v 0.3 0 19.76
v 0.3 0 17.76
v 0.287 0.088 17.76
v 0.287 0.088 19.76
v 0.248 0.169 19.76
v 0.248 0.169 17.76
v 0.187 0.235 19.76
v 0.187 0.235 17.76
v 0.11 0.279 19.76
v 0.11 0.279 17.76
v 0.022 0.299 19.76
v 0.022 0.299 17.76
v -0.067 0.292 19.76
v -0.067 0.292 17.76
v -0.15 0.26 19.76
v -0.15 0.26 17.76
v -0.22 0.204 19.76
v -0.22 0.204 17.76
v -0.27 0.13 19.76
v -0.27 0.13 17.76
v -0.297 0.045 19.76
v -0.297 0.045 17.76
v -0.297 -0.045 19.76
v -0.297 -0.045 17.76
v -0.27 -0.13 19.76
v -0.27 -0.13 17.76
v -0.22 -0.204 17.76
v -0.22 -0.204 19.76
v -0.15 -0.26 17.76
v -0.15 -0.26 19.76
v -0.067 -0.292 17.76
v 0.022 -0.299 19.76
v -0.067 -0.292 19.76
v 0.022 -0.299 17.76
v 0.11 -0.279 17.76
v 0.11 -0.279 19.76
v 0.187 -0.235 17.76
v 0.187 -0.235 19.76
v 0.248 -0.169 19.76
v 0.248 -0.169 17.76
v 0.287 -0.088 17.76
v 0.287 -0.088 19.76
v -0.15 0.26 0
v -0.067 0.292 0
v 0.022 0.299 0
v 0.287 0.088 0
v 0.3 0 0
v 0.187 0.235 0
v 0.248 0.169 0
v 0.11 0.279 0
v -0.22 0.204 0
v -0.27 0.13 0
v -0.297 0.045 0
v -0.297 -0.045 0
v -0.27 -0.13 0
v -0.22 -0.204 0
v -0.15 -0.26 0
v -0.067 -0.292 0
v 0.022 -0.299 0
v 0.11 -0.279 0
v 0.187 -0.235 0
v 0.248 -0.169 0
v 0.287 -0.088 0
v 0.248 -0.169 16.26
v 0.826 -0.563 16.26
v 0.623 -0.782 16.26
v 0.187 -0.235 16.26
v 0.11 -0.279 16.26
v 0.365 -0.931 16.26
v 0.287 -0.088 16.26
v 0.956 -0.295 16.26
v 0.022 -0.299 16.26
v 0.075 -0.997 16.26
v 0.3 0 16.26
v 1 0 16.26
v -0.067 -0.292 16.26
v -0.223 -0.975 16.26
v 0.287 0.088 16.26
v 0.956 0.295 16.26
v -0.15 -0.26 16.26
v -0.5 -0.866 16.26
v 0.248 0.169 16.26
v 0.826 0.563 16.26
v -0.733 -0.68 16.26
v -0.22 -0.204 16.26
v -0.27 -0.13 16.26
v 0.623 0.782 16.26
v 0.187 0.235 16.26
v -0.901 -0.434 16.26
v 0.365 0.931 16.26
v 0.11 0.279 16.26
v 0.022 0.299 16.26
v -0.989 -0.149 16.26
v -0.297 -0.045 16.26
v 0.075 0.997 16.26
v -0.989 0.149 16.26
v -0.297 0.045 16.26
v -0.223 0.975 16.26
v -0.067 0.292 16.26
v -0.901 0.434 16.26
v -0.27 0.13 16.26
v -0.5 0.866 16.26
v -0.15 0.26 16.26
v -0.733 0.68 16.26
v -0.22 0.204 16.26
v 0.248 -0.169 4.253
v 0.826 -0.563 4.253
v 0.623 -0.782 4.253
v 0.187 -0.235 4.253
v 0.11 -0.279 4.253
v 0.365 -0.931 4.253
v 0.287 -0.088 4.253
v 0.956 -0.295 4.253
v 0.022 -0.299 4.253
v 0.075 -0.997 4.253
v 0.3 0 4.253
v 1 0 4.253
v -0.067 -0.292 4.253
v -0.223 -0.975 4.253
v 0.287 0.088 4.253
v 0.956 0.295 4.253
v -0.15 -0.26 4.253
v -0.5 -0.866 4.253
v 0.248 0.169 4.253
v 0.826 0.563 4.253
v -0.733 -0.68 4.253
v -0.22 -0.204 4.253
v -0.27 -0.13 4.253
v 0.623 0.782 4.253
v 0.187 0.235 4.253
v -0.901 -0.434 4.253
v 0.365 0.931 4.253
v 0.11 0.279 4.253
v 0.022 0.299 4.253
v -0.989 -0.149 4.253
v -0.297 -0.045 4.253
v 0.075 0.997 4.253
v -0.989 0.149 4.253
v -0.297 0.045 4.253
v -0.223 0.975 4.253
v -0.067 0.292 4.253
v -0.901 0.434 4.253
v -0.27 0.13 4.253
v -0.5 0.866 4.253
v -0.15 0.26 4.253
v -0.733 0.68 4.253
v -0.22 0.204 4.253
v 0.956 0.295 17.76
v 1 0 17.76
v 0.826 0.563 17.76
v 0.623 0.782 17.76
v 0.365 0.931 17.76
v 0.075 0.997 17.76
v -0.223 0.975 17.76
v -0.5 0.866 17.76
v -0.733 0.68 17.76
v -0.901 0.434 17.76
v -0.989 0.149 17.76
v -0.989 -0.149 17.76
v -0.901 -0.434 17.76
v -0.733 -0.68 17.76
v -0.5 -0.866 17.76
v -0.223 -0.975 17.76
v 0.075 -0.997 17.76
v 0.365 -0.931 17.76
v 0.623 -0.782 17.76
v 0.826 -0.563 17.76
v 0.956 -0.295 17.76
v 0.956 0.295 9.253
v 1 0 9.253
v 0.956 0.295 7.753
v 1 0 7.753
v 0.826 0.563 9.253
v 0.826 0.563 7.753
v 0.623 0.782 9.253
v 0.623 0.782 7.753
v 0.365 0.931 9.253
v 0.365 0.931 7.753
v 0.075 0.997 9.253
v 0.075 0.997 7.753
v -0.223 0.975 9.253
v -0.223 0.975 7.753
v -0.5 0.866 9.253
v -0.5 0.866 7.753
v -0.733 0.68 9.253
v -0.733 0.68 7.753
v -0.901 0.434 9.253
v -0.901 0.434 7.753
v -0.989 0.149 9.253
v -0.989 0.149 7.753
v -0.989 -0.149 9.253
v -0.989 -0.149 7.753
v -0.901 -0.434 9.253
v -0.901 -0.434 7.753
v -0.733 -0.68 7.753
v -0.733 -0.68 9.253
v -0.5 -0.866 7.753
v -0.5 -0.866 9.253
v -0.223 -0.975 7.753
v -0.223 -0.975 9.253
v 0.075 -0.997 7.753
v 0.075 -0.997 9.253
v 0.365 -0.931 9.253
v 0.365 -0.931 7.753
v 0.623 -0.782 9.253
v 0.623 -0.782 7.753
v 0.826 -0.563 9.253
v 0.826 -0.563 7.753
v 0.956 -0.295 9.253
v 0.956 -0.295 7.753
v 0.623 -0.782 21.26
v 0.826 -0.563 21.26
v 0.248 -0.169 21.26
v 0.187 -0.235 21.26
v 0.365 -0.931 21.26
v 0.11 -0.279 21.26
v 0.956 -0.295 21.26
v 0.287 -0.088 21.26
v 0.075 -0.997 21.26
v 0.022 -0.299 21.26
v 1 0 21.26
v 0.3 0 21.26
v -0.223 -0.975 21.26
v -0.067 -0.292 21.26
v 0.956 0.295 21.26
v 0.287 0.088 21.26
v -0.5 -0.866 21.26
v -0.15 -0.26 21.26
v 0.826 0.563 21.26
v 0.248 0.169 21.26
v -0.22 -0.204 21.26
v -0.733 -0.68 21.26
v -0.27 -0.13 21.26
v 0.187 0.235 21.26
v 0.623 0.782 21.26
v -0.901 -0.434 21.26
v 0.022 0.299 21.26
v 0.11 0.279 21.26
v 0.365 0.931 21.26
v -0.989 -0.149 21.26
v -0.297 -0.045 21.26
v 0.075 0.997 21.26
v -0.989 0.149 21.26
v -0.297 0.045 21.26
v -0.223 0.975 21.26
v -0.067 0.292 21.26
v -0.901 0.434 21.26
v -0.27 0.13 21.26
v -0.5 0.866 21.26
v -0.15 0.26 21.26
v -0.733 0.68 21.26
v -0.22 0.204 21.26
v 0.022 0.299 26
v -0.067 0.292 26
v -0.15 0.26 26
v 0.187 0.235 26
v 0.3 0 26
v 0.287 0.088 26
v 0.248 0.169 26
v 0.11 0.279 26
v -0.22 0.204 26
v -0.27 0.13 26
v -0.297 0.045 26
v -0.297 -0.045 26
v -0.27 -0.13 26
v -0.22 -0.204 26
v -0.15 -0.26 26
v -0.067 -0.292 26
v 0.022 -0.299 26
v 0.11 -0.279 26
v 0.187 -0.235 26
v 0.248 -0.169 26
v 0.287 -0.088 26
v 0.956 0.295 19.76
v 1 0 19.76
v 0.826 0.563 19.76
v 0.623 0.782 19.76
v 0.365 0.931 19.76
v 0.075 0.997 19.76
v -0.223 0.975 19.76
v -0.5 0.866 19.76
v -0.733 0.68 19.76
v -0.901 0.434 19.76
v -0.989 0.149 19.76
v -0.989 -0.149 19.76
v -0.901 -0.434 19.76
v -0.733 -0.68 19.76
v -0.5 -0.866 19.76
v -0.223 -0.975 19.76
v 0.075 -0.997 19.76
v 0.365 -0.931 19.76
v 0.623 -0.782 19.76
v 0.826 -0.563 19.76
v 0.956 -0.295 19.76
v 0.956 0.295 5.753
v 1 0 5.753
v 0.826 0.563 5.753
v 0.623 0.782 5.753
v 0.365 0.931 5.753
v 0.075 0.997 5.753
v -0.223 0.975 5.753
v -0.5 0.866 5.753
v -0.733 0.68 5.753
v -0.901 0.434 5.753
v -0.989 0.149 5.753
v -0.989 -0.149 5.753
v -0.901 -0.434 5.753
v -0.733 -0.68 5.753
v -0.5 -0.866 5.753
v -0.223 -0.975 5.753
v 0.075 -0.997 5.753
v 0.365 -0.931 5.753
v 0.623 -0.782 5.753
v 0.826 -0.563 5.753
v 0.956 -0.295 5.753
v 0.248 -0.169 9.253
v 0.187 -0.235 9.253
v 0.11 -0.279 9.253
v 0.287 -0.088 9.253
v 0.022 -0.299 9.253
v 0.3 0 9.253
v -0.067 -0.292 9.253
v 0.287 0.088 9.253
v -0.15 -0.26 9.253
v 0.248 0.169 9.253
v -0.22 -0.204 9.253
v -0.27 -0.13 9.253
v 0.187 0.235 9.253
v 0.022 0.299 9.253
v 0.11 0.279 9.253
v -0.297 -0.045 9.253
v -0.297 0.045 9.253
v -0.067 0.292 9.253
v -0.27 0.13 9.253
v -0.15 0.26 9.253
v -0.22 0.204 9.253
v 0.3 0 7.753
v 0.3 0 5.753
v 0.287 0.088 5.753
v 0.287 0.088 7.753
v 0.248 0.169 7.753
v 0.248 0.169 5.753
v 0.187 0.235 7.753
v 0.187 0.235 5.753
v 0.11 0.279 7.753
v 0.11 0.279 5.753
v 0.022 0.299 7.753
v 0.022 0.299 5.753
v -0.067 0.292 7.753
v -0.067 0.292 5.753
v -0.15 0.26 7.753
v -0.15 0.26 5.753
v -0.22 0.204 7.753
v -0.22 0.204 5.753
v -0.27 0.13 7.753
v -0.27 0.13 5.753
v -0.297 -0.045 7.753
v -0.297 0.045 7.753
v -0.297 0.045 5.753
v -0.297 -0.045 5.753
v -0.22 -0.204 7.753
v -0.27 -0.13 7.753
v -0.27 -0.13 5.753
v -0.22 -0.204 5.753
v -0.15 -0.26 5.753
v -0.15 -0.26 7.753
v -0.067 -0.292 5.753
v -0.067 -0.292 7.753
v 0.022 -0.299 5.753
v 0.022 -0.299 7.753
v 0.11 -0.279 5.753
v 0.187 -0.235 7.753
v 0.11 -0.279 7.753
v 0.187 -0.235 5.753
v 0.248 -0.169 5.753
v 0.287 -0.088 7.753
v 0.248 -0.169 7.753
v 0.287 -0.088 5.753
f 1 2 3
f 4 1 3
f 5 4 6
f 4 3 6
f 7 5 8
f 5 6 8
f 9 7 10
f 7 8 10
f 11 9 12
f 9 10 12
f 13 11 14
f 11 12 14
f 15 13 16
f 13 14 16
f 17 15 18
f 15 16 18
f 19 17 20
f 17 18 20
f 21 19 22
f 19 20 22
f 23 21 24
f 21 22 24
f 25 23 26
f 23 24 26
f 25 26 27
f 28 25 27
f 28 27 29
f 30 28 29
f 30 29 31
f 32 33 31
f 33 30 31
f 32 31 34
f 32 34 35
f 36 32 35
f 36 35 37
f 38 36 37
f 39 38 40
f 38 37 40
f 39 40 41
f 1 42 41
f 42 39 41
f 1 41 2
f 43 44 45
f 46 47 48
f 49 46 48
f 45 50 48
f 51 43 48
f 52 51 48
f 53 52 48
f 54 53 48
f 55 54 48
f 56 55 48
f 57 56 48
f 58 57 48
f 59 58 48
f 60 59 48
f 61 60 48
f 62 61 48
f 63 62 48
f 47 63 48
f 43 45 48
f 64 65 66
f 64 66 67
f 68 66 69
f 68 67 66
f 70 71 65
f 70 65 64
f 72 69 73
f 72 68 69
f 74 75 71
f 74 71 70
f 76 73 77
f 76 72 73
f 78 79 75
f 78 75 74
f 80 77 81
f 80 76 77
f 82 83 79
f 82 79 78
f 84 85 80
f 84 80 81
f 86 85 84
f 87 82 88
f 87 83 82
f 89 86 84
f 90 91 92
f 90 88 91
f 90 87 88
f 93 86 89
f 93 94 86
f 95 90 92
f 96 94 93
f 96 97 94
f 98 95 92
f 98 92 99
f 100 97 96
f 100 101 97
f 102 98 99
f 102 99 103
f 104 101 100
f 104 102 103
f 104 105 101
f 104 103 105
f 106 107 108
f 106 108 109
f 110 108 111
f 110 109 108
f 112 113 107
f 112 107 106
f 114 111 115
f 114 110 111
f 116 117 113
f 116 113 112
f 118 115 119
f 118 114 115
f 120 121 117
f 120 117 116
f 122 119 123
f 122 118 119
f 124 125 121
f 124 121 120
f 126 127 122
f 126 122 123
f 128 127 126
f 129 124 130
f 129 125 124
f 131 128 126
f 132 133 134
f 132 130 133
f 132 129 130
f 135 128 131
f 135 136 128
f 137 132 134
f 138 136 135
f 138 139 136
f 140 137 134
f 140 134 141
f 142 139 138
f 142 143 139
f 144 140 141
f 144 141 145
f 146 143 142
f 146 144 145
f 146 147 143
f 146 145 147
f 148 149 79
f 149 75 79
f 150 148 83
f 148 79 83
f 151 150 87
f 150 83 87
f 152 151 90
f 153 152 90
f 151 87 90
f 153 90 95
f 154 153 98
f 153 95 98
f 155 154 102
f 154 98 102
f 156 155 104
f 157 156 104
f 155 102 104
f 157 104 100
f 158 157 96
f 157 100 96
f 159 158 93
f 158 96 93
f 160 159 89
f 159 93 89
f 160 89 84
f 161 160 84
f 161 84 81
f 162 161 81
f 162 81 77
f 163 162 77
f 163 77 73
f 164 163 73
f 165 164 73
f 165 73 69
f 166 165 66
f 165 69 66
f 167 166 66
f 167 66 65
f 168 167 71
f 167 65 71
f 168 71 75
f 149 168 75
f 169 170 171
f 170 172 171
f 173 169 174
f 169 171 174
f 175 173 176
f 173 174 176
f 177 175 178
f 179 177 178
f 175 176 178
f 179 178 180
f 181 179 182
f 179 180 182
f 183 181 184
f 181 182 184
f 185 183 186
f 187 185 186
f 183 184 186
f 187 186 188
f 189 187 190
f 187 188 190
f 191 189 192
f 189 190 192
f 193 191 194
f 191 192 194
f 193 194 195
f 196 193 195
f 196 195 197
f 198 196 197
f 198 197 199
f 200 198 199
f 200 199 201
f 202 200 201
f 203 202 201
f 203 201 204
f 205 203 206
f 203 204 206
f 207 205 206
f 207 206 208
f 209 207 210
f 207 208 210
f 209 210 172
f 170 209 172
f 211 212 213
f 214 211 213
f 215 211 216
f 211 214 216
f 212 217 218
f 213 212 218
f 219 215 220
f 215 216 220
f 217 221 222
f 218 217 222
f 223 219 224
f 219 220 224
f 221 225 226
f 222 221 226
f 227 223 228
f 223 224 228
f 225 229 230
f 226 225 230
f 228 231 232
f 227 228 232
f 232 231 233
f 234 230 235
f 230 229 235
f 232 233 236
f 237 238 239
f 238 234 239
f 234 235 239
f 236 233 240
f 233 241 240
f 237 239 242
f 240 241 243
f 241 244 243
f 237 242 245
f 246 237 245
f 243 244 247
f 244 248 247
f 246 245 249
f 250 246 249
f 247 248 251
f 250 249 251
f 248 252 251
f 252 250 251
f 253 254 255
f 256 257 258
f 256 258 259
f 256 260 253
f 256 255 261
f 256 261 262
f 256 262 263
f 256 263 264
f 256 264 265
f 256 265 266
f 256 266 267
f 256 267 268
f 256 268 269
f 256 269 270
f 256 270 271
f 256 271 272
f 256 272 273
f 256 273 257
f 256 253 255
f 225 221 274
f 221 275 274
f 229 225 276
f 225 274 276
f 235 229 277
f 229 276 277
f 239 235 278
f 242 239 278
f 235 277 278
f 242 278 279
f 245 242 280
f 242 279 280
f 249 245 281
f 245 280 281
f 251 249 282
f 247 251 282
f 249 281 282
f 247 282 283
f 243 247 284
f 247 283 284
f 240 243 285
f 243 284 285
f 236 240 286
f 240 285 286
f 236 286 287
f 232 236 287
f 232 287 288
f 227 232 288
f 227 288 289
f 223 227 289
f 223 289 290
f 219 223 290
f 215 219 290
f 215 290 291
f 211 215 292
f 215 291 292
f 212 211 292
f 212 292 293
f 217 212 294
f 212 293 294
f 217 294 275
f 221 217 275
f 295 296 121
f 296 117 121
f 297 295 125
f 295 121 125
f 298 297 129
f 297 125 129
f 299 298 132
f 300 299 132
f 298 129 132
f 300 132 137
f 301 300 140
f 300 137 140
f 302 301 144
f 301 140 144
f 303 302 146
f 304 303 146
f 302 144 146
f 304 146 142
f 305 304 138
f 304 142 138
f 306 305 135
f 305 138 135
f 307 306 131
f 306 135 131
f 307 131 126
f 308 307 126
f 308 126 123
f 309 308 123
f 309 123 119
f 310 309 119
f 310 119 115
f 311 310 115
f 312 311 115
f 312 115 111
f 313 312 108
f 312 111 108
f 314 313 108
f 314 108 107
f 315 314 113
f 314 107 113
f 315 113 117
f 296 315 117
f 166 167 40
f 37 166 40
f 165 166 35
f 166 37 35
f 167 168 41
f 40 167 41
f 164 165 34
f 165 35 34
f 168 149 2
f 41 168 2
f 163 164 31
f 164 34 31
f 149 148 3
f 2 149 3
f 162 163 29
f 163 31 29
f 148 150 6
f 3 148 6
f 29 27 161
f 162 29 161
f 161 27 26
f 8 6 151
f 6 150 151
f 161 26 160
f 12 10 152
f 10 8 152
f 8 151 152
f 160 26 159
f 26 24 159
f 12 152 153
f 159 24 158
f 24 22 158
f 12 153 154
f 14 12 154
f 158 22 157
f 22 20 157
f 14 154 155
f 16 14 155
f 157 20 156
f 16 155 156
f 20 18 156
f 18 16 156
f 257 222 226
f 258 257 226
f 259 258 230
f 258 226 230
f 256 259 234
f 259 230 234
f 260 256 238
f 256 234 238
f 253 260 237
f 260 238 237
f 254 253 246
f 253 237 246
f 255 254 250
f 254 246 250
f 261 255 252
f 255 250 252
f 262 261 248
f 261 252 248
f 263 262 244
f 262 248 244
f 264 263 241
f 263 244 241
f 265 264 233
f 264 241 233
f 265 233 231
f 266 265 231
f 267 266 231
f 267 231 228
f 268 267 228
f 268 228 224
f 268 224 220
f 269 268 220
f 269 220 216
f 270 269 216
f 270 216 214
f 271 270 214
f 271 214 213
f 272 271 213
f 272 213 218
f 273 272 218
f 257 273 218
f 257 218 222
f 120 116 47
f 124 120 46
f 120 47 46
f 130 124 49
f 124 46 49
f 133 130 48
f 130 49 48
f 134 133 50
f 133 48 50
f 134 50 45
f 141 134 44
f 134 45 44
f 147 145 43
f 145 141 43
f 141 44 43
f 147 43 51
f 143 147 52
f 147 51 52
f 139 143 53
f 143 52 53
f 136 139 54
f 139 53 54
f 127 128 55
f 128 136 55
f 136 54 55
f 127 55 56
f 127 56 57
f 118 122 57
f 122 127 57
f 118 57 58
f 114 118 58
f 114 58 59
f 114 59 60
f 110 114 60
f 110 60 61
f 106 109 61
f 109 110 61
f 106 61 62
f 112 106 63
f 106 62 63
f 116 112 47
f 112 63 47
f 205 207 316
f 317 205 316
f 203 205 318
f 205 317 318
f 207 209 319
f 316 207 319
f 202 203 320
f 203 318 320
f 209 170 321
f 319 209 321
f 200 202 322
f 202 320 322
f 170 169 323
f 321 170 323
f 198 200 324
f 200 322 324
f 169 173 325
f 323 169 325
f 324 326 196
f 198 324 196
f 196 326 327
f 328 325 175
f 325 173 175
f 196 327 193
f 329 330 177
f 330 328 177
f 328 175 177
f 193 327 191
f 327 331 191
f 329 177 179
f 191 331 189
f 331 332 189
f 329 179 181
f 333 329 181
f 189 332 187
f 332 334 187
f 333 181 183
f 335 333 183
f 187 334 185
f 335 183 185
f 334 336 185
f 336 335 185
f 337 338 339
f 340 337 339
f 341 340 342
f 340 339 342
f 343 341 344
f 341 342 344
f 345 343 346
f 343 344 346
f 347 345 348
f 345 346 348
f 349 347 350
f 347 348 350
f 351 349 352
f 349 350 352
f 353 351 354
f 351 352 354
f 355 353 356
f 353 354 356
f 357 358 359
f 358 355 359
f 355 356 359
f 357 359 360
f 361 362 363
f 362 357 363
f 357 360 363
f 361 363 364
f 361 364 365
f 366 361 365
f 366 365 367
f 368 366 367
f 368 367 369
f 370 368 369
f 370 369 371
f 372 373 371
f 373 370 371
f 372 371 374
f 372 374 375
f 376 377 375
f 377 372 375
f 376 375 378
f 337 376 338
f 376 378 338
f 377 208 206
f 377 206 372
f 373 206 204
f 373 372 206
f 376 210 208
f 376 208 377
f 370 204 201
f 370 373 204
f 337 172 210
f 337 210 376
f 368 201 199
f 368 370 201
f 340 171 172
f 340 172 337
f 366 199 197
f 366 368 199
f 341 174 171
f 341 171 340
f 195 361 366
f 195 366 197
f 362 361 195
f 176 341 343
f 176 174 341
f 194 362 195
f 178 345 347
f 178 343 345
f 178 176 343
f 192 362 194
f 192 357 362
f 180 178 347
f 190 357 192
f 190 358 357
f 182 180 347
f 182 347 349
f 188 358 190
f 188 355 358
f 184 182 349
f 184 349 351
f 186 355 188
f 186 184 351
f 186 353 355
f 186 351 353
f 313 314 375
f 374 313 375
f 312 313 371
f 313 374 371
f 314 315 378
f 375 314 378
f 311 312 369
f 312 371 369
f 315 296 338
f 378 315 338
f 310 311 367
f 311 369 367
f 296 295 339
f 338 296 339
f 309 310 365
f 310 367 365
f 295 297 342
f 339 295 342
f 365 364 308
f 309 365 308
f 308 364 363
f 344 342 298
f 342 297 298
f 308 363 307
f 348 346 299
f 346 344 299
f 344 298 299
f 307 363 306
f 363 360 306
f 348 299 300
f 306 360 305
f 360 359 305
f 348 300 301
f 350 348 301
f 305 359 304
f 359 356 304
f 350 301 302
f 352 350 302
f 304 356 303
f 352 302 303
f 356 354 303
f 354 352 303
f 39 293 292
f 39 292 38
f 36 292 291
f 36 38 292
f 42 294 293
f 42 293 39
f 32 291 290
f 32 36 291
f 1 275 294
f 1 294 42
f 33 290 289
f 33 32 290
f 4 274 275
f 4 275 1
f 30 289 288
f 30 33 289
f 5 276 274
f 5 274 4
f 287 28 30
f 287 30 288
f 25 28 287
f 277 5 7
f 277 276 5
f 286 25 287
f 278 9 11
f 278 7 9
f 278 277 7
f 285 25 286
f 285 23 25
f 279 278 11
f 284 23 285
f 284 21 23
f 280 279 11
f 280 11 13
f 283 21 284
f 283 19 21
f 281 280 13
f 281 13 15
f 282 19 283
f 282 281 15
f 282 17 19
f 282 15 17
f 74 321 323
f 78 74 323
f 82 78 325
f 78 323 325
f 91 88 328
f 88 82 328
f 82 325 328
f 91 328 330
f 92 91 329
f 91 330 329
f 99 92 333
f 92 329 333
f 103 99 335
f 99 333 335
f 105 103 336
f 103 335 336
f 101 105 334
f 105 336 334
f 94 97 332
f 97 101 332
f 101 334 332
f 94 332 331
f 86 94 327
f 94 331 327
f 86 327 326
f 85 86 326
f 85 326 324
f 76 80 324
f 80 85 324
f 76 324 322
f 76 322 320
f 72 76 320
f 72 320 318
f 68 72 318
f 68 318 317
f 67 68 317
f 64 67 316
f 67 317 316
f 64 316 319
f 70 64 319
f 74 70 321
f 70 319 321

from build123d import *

# Parameters (mm, degrees)
SKETCH1_R           = 0.3
BOSS_EXTRUDE1_DEPTH = 26
SKETCH2_W           = 1
SKETCH2_H           = 1.5


with BuildPart() as part:
    # Sketch1 → Boss-Extrude1 (new body)
    with BuildSketch(Plane.XY):
        Circle(SKETCH1_R)
    extrude(amount=BOSS_EXTRUDE1_DEPTH)

    # Sketch2 → Revolve1 (revolve)
    with BuildSketch(Plane(origin=(0, 0, 0), x_dir=(1, 0, 0), z_dir=(0, 1, 0))):
        with Locations((0.5, -5.003)):
            Rectangle(SKETCH2_W, SKETCH2_H)
        with Locations((0.5, -8.503)):
            Rectangle(SKETCH2_W, SKETCH2_H)
        with Locations((0.5, -17.01)):
            Rectangle(SKETCH2_W, SKETCH2_H)
        with Locations((0.5, -20.51)):
            Rectangle(SKETCH2_W, SKETCH2_H)
    revolve(axis=Axis((0, 0, 0), (0, 0, 1)))


solid = part.part
